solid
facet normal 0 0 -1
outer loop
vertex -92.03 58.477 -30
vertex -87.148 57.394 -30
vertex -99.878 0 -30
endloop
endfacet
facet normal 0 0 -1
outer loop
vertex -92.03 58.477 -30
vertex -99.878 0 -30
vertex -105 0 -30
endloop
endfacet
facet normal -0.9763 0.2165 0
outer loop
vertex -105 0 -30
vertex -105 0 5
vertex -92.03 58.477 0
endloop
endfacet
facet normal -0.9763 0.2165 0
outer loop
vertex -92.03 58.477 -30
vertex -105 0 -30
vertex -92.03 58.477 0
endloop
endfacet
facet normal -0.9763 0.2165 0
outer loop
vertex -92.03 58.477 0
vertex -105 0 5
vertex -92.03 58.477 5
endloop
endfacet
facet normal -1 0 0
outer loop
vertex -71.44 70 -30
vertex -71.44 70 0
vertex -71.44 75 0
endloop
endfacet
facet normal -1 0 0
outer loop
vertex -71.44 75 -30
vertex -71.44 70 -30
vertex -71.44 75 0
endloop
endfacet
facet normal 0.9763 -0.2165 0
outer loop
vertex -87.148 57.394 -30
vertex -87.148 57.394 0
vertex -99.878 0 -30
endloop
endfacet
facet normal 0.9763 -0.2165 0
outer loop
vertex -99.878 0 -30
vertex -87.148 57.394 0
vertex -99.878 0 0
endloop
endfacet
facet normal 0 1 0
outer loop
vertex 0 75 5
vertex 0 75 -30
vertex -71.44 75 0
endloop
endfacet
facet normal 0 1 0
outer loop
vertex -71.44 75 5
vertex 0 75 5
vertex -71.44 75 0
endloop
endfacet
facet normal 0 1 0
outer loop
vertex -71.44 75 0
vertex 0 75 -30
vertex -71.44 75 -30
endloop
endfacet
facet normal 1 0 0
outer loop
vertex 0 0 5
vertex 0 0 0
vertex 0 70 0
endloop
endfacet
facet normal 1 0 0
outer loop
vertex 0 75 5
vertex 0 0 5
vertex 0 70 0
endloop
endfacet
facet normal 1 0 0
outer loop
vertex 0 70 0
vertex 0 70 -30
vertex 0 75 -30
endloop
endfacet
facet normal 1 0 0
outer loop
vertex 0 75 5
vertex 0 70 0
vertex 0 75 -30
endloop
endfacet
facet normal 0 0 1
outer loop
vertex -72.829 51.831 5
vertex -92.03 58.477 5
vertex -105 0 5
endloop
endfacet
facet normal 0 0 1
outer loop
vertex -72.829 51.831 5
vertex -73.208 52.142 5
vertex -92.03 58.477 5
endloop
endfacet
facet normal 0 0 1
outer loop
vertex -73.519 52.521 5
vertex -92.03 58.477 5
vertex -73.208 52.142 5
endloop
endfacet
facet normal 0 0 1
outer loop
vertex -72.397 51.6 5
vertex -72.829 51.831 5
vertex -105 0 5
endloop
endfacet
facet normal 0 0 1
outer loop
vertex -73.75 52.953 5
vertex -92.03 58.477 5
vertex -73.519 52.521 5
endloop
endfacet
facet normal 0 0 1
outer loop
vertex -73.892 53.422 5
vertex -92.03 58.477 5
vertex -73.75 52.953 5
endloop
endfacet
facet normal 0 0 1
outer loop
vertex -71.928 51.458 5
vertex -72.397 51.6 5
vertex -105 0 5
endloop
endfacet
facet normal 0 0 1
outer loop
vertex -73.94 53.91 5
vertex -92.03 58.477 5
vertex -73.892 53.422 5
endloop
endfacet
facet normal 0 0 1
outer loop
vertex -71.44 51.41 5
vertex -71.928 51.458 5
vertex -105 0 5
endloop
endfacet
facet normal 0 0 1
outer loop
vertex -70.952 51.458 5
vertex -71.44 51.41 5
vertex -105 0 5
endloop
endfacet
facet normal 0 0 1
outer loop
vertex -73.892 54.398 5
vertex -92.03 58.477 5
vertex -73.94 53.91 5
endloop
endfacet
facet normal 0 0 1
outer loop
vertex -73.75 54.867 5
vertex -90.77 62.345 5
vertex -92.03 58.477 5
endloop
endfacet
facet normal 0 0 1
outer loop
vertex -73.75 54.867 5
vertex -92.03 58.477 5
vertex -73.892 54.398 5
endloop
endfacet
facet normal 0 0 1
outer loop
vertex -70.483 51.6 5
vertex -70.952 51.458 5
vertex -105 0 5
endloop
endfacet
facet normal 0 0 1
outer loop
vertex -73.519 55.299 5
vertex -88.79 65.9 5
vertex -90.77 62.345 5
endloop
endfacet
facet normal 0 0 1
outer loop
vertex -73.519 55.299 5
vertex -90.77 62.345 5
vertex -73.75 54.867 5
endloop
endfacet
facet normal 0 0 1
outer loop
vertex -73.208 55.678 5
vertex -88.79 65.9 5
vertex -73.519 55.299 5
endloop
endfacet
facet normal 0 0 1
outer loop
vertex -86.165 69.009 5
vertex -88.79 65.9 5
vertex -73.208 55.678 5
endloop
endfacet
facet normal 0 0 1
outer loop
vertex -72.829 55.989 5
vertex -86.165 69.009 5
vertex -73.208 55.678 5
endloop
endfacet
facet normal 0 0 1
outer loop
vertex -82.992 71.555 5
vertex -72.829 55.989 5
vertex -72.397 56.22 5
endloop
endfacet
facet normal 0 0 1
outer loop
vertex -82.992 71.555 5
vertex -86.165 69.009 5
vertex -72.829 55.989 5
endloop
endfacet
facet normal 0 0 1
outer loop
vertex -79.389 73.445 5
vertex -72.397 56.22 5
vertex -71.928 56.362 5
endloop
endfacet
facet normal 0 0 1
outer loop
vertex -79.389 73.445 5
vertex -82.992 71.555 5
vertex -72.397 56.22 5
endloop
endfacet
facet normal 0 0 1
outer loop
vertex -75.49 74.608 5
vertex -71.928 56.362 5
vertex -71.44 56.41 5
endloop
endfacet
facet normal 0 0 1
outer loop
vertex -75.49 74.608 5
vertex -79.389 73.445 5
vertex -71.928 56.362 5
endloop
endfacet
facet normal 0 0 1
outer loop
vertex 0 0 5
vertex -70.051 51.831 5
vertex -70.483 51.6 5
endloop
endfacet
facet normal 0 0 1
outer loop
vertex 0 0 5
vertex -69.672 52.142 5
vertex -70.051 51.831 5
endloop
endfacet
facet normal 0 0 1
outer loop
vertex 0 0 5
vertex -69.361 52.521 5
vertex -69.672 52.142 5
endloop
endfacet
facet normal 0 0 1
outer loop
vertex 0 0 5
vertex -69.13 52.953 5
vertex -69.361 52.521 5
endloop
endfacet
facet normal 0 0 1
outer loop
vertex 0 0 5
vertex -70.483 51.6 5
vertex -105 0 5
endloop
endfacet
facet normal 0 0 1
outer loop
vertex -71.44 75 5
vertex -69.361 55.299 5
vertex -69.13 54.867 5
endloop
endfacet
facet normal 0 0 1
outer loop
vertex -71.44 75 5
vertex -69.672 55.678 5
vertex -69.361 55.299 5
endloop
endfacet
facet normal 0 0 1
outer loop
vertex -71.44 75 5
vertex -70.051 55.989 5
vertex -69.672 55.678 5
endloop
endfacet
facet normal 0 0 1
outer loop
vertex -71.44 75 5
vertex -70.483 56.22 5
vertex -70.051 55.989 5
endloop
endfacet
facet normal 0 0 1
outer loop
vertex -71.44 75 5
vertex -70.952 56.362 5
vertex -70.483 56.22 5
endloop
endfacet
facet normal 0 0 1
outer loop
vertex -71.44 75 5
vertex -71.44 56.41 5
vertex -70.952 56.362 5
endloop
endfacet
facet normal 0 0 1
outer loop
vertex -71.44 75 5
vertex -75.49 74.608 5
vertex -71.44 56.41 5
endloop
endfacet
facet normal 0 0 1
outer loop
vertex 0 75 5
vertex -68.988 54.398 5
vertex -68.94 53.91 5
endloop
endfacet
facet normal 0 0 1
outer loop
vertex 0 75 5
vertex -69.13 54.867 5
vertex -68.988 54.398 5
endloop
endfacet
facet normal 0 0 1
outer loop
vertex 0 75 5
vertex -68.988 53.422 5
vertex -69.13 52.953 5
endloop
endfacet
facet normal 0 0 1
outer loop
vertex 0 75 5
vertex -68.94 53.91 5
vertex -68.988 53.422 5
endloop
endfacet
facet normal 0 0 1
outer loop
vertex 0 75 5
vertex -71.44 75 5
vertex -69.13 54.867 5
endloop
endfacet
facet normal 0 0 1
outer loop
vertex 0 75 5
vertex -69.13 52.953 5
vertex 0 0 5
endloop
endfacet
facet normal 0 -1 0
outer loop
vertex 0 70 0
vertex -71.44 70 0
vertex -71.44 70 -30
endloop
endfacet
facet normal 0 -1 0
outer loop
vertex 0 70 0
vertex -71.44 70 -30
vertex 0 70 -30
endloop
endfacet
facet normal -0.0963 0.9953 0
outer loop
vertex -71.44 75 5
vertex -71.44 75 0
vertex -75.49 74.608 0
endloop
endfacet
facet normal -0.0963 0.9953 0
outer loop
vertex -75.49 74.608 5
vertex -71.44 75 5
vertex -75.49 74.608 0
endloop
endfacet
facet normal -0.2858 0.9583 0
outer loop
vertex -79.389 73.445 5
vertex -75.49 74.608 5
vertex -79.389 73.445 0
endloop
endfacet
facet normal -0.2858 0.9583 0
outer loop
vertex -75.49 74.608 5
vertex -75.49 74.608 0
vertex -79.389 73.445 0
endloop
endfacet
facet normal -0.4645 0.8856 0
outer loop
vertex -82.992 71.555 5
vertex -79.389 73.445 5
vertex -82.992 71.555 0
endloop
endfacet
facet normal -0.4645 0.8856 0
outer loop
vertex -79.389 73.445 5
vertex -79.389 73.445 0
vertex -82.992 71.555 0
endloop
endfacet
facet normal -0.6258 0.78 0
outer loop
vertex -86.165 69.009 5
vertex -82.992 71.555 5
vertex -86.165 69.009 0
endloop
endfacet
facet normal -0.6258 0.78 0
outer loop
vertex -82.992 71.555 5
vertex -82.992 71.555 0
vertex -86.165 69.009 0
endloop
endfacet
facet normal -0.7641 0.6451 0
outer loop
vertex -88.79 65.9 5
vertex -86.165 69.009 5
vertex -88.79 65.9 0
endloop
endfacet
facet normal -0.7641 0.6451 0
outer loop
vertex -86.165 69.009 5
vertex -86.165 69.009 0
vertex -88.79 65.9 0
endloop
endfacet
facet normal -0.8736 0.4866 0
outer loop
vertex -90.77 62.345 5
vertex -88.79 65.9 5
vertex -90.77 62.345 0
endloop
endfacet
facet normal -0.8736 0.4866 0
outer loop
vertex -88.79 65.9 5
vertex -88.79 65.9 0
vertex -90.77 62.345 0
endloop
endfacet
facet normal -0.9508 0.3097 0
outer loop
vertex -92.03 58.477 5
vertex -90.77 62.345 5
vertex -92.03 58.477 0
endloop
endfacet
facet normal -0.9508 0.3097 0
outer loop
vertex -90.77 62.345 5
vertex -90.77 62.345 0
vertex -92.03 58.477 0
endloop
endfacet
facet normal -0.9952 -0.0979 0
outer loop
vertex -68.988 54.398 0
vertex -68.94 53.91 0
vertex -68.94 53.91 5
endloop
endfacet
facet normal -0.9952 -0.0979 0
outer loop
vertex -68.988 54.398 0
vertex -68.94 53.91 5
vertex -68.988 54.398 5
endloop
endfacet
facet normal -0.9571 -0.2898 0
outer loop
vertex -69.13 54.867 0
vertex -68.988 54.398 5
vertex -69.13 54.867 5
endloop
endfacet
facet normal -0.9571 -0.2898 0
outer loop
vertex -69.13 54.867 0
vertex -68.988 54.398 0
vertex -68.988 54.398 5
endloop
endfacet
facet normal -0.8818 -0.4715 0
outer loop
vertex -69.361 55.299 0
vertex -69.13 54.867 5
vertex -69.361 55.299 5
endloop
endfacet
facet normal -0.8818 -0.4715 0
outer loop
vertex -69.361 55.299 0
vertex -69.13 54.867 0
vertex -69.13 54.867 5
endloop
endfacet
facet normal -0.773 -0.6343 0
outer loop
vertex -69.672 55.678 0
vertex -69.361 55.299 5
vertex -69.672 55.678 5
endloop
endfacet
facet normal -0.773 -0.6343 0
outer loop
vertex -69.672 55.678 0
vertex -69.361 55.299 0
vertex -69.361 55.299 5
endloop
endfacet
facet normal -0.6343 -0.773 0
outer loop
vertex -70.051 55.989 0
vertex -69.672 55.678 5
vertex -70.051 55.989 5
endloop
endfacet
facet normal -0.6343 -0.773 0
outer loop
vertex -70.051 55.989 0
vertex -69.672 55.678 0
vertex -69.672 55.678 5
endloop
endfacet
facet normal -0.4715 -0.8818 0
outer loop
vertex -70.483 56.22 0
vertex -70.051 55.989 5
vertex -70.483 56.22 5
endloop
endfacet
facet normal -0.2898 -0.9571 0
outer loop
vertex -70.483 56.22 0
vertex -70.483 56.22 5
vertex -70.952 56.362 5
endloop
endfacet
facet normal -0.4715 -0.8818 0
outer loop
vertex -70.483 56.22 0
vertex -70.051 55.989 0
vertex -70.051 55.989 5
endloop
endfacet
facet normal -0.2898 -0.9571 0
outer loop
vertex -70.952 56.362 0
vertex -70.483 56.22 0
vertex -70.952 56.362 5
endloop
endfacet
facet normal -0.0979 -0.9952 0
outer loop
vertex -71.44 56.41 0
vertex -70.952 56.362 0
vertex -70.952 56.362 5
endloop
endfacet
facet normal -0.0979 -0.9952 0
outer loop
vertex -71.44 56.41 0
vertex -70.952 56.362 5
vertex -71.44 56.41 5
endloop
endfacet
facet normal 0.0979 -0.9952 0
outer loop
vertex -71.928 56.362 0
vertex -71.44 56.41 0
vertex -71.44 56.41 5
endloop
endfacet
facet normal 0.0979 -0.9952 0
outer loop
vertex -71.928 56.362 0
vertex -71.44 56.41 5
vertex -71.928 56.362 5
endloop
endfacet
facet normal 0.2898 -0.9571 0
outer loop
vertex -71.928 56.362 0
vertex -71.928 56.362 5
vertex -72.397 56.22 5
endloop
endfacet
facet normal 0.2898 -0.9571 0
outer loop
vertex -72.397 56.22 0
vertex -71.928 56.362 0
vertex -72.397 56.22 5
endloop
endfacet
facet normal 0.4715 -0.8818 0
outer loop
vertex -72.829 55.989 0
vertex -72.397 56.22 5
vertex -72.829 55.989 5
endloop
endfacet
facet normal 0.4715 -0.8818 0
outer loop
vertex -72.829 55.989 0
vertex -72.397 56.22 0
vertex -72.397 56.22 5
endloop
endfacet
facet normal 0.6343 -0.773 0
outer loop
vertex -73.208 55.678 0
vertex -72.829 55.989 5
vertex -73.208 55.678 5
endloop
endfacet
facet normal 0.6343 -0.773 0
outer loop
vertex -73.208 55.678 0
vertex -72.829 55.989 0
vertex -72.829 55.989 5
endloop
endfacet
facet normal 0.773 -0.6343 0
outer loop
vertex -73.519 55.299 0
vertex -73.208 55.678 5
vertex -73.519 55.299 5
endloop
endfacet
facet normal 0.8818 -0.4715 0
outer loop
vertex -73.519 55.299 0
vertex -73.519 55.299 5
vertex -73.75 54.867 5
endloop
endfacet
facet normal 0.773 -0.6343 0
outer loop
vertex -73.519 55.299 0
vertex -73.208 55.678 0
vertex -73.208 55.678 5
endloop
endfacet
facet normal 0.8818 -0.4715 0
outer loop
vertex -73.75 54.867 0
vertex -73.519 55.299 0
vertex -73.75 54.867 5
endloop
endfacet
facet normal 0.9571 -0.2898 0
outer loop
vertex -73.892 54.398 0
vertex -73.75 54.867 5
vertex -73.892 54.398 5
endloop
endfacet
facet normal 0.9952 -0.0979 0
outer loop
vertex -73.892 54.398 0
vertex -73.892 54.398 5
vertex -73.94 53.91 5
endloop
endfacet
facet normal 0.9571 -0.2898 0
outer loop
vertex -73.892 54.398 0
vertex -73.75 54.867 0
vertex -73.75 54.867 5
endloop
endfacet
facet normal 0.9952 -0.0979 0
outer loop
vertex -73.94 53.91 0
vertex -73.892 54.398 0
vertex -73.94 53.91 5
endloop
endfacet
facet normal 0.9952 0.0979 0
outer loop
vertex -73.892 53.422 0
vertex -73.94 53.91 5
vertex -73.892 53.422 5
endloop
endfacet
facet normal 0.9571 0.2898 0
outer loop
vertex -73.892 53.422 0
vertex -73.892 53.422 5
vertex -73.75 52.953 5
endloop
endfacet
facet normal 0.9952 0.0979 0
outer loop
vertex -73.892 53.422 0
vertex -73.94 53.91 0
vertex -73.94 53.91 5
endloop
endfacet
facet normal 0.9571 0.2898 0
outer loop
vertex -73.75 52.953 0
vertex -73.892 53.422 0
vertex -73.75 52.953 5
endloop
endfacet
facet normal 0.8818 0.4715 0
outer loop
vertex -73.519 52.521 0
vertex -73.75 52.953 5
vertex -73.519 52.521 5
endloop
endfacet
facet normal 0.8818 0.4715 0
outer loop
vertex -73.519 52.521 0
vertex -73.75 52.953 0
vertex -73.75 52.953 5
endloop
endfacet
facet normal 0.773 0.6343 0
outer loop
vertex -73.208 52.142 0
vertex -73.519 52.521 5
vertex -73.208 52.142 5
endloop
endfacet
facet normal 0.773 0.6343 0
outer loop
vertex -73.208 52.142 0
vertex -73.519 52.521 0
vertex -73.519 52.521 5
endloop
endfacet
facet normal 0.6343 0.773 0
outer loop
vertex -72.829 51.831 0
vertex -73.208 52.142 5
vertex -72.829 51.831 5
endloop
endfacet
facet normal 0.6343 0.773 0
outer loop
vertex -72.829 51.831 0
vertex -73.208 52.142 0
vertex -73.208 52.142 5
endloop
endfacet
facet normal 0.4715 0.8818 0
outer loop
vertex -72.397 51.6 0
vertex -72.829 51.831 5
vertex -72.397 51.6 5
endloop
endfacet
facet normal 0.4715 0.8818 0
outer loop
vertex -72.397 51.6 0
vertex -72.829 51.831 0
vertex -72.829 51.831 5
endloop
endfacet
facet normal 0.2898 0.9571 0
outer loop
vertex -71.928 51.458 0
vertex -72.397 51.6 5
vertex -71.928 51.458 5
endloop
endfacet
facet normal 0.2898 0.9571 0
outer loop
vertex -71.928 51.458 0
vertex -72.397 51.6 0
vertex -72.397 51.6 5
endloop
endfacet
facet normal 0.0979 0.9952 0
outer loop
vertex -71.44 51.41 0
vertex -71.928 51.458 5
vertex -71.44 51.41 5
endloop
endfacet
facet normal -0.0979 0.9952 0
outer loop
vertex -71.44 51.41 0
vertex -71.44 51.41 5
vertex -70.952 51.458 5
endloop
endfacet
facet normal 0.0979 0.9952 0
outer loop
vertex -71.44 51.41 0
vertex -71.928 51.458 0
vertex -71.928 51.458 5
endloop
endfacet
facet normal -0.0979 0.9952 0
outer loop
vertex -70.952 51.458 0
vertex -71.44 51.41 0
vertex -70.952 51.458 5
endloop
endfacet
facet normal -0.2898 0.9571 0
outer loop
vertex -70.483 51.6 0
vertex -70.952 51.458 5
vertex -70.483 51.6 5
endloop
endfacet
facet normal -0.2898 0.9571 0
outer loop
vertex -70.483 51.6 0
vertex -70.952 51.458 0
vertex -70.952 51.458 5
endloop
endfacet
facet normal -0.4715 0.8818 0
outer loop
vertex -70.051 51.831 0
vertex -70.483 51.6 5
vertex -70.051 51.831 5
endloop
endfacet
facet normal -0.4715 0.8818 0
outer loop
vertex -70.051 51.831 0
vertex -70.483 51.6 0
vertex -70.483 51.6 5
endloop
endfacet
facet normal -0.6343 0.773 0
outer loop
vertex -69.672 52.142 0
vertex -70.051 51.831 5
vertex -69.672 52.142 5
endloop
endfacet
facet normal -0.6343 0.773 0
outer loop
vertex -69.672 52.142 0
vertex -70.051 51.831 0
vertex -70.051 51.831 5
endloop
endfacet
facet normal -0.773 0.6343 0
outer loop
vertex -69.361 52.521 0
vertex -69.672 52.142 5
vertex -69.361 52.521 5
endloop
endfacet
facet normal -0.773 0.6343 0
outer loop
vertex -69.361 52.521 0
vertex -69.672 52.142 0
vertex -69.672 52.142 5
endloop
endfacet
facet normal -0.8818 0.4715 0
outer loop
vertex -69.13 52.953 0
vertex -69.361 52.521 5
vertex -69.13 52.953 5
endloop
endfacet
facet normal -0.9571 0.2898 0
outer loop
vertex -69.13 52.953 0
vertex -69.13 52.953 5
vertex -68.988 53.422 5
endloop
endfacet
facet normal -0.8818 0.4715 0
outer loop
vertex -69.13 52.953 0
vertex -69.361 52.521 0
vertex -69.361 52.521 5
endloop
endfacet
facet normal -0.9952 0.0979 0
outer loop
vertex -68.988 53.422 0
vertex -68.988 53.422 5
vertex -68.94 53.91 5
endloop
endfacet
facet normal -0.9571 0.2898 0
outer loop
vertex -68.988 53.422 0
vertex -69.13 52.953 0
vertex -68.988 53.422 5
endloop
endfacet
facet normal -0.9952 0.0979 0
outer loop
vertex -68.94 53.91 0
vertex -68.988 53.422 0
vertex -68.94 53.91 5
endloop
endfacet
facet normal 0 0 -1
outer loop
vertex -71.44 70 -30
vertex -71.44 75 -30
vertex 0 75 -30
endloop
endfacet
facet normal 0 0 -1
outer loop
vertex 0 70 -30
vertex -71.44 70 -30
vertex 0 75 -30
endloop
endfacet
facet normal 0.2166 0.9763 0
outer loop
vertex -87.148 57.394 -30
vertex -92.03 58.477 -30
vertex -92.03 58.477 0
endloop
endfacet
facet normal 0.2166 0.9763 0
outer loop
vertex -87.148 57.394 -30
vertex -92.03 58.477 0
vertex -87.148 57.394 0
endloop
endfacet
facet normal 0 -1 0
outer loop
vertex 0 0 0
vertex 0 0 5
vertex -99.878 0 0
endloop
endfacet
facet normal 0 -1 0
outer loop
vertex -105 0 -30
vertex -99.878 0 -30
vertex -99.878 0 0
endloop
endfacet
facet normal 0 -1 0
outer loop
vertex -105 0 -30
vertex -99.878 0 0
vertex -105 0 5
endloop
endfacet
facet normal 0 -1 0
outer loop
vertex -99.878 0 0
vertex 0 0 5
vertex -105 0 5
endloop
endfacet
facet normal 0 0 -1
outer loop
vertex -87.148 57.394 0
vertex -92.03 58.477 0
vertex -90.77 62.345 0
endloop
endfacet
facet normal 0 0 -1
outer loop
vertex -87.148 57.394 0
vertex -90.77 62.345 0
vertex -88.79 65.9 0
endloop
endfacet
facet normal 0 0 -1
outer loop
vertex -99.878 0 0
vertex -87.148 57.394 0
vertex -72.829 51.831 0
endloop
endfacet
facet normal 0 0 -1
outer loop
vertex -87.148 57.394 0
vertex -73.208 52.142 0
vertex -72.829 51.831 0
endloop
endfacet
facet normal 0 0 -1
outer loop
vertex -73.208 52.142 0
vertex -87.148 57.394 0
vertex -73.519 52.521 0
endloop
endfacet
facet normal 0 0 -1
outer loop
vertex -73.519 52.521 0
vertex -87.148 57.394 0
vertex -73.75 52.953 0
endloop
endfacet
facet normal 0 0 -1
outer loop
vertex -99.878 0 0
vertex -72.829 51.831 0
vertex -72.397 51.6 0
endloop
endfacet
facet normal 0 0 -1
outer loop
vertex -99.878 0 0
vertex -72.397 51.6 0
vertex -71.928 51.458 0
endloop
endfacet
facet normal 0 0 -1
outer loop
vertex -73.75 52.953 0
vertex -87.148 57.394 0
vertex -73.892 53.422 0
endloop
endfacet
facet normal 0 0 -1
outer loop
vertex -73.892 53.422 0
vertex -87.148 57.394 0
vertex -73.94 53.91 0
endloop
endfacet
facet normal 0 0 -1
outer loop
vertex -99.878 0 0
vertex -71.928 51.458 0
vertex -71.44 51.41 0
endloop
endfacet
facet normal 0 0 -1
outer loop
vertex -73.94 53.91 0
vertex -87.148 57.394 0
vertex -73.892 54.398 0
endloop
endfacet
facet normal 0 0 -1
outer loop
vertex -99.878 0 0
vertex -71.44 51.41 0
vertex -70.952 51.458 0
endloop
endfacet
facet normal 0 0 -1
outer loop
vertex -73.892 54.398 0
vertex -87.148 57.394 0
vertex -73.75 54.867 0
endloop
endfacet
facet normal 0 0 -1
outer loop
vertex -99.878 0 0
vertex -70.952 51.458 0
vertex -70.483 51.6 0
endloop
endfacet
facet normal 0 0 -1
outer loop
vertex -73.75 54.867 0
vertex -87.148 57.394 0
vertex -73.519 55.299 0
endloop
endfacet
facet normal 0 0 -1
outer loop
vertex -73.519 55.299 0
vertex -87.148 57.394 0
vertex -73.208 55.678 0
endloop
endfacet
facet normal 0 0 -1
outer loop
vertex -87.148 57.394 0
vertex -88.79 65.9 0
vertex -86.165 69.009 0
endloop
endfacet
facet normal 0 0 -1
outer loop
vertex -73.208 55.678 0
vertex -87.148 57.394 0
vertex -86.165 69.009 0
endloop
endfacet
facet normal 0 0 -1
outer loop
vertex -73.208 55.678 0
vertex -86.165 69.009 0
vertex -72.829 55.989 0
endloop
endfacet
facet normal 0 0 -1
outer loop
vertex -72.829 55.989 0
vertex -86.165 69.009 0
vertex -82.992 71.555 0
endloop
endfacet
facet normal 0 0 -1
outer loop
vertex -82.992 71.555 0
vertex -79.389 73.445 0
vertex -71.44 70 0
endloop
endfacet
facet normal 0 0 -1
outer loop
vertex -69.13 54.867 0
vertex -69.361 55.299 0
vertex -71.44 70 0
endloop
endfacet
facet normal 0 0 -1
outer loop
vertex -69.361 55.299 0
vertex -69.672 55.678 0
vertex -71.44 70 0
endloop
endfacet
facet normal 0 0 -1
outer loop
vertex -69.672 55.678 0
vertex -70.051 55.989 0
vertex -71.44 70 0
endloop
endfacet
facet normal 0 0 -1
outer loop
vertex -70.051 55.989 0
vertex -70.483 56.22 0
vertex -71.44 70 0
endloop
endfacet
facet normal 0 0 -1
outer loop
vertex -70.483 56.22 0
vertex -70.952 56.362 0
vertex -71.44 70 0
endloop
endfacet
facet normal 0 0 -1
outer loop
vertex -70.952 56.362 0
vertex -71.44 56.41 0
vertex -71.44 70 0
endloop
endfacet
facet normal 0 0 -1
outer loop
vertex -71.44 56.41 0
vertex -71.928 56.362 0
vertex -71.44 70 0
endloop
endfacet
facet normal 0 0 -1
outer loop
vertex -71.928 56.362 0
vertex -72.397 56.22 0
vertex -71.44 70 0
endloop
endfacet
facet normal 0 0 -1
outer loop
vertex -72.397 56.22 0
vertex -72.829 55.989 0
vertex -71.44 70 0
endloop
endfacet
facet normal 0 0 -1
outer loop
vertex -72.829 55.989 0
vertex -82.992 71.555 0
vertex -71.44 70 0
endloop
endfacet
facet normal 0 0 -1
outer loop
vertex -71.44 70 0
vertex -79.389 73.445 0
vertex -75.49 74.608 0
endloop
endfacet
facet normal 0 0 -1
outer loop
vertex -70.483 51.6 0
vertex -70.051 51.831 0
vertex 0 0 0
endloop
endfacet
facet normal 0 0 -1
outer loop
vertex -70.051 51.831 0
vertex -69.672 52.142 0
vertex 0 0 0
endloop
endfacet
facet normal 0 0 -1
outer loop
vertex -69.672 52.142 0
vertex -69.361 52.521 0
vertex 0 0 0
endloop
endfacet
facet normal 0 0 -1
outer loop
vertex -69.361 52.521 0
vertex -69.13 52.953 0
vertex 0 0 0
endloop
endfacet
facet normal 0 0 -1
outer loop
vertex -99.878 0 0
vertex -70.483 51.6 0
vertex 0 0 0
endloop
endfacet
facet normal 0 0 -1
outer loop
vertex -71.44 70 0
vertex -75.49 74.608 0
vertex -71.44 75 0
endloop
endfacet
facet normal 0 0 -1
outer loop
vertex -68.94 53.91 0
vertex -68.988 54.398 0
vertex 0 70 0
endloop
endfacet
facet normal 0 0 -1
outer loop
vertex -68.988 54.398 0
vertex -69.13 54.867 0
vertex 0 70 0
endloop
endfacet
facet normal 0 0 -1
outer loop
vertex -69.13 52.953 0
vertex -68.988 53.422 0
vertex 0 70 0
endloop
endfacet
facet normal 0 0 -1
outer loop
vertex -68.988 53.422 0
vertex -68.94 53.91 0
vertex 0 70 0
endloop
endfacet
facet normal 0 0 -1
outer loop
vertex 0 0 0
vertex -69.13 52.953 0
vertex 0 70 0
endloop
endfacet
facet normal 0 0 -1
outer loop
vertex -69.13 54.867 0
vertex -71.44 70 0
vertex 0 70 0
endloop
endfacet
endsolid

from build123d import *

# Parameters (mm, degrees)
SKETCH1_R           = 2.5
BOSS_EXTRUDE1_DEPTH = 5
SKETCH2_W           = 71.44
SKETCH2_H           = 5
BOSS_EXTRUDE2_DEPTH = 35


with BuildPart() as part:
    # Sketch1 → Boss-Extrude1 (new body)
    with BuildSketch(Plane.XY):
        with BuildLine():
            Line((-92.029607558, 58.476854566), (-105, 0))
            Line((-105, 0), (0, 0))
            Line((0, 0), (0, 75))
            Line((0, 75), (-71.44, 75))
            ThreePointArc((-71.44, 75), (-84.639870022, 70.358450729), (-92.029607558, 58.476854566))
        make_face()
        with Locations((-71.44, 53.91)):
            Circle(SKETCH1_R, mode=Mode.SUBTRACT)
    extrude(amount=BOSS_EXTRUDE1_DEPTH)

    # Sketch2 → Boss-Extrude2 (add)
    with BuildSketch(Plane.XY.offset(5)):
        Polygon((-105, 0), (-92.029607558, 58.476854566), (-87.14824019, 57.39414841), (-99.878484221, 0), align=None)
        with Locations((-35.72, 72.5)):
            Rectangle(SKETCH2_W, SKETCH2_H)
    extrude(amount=-BOSS_EXTRUDE2_DEPTH)


solid = part.part
